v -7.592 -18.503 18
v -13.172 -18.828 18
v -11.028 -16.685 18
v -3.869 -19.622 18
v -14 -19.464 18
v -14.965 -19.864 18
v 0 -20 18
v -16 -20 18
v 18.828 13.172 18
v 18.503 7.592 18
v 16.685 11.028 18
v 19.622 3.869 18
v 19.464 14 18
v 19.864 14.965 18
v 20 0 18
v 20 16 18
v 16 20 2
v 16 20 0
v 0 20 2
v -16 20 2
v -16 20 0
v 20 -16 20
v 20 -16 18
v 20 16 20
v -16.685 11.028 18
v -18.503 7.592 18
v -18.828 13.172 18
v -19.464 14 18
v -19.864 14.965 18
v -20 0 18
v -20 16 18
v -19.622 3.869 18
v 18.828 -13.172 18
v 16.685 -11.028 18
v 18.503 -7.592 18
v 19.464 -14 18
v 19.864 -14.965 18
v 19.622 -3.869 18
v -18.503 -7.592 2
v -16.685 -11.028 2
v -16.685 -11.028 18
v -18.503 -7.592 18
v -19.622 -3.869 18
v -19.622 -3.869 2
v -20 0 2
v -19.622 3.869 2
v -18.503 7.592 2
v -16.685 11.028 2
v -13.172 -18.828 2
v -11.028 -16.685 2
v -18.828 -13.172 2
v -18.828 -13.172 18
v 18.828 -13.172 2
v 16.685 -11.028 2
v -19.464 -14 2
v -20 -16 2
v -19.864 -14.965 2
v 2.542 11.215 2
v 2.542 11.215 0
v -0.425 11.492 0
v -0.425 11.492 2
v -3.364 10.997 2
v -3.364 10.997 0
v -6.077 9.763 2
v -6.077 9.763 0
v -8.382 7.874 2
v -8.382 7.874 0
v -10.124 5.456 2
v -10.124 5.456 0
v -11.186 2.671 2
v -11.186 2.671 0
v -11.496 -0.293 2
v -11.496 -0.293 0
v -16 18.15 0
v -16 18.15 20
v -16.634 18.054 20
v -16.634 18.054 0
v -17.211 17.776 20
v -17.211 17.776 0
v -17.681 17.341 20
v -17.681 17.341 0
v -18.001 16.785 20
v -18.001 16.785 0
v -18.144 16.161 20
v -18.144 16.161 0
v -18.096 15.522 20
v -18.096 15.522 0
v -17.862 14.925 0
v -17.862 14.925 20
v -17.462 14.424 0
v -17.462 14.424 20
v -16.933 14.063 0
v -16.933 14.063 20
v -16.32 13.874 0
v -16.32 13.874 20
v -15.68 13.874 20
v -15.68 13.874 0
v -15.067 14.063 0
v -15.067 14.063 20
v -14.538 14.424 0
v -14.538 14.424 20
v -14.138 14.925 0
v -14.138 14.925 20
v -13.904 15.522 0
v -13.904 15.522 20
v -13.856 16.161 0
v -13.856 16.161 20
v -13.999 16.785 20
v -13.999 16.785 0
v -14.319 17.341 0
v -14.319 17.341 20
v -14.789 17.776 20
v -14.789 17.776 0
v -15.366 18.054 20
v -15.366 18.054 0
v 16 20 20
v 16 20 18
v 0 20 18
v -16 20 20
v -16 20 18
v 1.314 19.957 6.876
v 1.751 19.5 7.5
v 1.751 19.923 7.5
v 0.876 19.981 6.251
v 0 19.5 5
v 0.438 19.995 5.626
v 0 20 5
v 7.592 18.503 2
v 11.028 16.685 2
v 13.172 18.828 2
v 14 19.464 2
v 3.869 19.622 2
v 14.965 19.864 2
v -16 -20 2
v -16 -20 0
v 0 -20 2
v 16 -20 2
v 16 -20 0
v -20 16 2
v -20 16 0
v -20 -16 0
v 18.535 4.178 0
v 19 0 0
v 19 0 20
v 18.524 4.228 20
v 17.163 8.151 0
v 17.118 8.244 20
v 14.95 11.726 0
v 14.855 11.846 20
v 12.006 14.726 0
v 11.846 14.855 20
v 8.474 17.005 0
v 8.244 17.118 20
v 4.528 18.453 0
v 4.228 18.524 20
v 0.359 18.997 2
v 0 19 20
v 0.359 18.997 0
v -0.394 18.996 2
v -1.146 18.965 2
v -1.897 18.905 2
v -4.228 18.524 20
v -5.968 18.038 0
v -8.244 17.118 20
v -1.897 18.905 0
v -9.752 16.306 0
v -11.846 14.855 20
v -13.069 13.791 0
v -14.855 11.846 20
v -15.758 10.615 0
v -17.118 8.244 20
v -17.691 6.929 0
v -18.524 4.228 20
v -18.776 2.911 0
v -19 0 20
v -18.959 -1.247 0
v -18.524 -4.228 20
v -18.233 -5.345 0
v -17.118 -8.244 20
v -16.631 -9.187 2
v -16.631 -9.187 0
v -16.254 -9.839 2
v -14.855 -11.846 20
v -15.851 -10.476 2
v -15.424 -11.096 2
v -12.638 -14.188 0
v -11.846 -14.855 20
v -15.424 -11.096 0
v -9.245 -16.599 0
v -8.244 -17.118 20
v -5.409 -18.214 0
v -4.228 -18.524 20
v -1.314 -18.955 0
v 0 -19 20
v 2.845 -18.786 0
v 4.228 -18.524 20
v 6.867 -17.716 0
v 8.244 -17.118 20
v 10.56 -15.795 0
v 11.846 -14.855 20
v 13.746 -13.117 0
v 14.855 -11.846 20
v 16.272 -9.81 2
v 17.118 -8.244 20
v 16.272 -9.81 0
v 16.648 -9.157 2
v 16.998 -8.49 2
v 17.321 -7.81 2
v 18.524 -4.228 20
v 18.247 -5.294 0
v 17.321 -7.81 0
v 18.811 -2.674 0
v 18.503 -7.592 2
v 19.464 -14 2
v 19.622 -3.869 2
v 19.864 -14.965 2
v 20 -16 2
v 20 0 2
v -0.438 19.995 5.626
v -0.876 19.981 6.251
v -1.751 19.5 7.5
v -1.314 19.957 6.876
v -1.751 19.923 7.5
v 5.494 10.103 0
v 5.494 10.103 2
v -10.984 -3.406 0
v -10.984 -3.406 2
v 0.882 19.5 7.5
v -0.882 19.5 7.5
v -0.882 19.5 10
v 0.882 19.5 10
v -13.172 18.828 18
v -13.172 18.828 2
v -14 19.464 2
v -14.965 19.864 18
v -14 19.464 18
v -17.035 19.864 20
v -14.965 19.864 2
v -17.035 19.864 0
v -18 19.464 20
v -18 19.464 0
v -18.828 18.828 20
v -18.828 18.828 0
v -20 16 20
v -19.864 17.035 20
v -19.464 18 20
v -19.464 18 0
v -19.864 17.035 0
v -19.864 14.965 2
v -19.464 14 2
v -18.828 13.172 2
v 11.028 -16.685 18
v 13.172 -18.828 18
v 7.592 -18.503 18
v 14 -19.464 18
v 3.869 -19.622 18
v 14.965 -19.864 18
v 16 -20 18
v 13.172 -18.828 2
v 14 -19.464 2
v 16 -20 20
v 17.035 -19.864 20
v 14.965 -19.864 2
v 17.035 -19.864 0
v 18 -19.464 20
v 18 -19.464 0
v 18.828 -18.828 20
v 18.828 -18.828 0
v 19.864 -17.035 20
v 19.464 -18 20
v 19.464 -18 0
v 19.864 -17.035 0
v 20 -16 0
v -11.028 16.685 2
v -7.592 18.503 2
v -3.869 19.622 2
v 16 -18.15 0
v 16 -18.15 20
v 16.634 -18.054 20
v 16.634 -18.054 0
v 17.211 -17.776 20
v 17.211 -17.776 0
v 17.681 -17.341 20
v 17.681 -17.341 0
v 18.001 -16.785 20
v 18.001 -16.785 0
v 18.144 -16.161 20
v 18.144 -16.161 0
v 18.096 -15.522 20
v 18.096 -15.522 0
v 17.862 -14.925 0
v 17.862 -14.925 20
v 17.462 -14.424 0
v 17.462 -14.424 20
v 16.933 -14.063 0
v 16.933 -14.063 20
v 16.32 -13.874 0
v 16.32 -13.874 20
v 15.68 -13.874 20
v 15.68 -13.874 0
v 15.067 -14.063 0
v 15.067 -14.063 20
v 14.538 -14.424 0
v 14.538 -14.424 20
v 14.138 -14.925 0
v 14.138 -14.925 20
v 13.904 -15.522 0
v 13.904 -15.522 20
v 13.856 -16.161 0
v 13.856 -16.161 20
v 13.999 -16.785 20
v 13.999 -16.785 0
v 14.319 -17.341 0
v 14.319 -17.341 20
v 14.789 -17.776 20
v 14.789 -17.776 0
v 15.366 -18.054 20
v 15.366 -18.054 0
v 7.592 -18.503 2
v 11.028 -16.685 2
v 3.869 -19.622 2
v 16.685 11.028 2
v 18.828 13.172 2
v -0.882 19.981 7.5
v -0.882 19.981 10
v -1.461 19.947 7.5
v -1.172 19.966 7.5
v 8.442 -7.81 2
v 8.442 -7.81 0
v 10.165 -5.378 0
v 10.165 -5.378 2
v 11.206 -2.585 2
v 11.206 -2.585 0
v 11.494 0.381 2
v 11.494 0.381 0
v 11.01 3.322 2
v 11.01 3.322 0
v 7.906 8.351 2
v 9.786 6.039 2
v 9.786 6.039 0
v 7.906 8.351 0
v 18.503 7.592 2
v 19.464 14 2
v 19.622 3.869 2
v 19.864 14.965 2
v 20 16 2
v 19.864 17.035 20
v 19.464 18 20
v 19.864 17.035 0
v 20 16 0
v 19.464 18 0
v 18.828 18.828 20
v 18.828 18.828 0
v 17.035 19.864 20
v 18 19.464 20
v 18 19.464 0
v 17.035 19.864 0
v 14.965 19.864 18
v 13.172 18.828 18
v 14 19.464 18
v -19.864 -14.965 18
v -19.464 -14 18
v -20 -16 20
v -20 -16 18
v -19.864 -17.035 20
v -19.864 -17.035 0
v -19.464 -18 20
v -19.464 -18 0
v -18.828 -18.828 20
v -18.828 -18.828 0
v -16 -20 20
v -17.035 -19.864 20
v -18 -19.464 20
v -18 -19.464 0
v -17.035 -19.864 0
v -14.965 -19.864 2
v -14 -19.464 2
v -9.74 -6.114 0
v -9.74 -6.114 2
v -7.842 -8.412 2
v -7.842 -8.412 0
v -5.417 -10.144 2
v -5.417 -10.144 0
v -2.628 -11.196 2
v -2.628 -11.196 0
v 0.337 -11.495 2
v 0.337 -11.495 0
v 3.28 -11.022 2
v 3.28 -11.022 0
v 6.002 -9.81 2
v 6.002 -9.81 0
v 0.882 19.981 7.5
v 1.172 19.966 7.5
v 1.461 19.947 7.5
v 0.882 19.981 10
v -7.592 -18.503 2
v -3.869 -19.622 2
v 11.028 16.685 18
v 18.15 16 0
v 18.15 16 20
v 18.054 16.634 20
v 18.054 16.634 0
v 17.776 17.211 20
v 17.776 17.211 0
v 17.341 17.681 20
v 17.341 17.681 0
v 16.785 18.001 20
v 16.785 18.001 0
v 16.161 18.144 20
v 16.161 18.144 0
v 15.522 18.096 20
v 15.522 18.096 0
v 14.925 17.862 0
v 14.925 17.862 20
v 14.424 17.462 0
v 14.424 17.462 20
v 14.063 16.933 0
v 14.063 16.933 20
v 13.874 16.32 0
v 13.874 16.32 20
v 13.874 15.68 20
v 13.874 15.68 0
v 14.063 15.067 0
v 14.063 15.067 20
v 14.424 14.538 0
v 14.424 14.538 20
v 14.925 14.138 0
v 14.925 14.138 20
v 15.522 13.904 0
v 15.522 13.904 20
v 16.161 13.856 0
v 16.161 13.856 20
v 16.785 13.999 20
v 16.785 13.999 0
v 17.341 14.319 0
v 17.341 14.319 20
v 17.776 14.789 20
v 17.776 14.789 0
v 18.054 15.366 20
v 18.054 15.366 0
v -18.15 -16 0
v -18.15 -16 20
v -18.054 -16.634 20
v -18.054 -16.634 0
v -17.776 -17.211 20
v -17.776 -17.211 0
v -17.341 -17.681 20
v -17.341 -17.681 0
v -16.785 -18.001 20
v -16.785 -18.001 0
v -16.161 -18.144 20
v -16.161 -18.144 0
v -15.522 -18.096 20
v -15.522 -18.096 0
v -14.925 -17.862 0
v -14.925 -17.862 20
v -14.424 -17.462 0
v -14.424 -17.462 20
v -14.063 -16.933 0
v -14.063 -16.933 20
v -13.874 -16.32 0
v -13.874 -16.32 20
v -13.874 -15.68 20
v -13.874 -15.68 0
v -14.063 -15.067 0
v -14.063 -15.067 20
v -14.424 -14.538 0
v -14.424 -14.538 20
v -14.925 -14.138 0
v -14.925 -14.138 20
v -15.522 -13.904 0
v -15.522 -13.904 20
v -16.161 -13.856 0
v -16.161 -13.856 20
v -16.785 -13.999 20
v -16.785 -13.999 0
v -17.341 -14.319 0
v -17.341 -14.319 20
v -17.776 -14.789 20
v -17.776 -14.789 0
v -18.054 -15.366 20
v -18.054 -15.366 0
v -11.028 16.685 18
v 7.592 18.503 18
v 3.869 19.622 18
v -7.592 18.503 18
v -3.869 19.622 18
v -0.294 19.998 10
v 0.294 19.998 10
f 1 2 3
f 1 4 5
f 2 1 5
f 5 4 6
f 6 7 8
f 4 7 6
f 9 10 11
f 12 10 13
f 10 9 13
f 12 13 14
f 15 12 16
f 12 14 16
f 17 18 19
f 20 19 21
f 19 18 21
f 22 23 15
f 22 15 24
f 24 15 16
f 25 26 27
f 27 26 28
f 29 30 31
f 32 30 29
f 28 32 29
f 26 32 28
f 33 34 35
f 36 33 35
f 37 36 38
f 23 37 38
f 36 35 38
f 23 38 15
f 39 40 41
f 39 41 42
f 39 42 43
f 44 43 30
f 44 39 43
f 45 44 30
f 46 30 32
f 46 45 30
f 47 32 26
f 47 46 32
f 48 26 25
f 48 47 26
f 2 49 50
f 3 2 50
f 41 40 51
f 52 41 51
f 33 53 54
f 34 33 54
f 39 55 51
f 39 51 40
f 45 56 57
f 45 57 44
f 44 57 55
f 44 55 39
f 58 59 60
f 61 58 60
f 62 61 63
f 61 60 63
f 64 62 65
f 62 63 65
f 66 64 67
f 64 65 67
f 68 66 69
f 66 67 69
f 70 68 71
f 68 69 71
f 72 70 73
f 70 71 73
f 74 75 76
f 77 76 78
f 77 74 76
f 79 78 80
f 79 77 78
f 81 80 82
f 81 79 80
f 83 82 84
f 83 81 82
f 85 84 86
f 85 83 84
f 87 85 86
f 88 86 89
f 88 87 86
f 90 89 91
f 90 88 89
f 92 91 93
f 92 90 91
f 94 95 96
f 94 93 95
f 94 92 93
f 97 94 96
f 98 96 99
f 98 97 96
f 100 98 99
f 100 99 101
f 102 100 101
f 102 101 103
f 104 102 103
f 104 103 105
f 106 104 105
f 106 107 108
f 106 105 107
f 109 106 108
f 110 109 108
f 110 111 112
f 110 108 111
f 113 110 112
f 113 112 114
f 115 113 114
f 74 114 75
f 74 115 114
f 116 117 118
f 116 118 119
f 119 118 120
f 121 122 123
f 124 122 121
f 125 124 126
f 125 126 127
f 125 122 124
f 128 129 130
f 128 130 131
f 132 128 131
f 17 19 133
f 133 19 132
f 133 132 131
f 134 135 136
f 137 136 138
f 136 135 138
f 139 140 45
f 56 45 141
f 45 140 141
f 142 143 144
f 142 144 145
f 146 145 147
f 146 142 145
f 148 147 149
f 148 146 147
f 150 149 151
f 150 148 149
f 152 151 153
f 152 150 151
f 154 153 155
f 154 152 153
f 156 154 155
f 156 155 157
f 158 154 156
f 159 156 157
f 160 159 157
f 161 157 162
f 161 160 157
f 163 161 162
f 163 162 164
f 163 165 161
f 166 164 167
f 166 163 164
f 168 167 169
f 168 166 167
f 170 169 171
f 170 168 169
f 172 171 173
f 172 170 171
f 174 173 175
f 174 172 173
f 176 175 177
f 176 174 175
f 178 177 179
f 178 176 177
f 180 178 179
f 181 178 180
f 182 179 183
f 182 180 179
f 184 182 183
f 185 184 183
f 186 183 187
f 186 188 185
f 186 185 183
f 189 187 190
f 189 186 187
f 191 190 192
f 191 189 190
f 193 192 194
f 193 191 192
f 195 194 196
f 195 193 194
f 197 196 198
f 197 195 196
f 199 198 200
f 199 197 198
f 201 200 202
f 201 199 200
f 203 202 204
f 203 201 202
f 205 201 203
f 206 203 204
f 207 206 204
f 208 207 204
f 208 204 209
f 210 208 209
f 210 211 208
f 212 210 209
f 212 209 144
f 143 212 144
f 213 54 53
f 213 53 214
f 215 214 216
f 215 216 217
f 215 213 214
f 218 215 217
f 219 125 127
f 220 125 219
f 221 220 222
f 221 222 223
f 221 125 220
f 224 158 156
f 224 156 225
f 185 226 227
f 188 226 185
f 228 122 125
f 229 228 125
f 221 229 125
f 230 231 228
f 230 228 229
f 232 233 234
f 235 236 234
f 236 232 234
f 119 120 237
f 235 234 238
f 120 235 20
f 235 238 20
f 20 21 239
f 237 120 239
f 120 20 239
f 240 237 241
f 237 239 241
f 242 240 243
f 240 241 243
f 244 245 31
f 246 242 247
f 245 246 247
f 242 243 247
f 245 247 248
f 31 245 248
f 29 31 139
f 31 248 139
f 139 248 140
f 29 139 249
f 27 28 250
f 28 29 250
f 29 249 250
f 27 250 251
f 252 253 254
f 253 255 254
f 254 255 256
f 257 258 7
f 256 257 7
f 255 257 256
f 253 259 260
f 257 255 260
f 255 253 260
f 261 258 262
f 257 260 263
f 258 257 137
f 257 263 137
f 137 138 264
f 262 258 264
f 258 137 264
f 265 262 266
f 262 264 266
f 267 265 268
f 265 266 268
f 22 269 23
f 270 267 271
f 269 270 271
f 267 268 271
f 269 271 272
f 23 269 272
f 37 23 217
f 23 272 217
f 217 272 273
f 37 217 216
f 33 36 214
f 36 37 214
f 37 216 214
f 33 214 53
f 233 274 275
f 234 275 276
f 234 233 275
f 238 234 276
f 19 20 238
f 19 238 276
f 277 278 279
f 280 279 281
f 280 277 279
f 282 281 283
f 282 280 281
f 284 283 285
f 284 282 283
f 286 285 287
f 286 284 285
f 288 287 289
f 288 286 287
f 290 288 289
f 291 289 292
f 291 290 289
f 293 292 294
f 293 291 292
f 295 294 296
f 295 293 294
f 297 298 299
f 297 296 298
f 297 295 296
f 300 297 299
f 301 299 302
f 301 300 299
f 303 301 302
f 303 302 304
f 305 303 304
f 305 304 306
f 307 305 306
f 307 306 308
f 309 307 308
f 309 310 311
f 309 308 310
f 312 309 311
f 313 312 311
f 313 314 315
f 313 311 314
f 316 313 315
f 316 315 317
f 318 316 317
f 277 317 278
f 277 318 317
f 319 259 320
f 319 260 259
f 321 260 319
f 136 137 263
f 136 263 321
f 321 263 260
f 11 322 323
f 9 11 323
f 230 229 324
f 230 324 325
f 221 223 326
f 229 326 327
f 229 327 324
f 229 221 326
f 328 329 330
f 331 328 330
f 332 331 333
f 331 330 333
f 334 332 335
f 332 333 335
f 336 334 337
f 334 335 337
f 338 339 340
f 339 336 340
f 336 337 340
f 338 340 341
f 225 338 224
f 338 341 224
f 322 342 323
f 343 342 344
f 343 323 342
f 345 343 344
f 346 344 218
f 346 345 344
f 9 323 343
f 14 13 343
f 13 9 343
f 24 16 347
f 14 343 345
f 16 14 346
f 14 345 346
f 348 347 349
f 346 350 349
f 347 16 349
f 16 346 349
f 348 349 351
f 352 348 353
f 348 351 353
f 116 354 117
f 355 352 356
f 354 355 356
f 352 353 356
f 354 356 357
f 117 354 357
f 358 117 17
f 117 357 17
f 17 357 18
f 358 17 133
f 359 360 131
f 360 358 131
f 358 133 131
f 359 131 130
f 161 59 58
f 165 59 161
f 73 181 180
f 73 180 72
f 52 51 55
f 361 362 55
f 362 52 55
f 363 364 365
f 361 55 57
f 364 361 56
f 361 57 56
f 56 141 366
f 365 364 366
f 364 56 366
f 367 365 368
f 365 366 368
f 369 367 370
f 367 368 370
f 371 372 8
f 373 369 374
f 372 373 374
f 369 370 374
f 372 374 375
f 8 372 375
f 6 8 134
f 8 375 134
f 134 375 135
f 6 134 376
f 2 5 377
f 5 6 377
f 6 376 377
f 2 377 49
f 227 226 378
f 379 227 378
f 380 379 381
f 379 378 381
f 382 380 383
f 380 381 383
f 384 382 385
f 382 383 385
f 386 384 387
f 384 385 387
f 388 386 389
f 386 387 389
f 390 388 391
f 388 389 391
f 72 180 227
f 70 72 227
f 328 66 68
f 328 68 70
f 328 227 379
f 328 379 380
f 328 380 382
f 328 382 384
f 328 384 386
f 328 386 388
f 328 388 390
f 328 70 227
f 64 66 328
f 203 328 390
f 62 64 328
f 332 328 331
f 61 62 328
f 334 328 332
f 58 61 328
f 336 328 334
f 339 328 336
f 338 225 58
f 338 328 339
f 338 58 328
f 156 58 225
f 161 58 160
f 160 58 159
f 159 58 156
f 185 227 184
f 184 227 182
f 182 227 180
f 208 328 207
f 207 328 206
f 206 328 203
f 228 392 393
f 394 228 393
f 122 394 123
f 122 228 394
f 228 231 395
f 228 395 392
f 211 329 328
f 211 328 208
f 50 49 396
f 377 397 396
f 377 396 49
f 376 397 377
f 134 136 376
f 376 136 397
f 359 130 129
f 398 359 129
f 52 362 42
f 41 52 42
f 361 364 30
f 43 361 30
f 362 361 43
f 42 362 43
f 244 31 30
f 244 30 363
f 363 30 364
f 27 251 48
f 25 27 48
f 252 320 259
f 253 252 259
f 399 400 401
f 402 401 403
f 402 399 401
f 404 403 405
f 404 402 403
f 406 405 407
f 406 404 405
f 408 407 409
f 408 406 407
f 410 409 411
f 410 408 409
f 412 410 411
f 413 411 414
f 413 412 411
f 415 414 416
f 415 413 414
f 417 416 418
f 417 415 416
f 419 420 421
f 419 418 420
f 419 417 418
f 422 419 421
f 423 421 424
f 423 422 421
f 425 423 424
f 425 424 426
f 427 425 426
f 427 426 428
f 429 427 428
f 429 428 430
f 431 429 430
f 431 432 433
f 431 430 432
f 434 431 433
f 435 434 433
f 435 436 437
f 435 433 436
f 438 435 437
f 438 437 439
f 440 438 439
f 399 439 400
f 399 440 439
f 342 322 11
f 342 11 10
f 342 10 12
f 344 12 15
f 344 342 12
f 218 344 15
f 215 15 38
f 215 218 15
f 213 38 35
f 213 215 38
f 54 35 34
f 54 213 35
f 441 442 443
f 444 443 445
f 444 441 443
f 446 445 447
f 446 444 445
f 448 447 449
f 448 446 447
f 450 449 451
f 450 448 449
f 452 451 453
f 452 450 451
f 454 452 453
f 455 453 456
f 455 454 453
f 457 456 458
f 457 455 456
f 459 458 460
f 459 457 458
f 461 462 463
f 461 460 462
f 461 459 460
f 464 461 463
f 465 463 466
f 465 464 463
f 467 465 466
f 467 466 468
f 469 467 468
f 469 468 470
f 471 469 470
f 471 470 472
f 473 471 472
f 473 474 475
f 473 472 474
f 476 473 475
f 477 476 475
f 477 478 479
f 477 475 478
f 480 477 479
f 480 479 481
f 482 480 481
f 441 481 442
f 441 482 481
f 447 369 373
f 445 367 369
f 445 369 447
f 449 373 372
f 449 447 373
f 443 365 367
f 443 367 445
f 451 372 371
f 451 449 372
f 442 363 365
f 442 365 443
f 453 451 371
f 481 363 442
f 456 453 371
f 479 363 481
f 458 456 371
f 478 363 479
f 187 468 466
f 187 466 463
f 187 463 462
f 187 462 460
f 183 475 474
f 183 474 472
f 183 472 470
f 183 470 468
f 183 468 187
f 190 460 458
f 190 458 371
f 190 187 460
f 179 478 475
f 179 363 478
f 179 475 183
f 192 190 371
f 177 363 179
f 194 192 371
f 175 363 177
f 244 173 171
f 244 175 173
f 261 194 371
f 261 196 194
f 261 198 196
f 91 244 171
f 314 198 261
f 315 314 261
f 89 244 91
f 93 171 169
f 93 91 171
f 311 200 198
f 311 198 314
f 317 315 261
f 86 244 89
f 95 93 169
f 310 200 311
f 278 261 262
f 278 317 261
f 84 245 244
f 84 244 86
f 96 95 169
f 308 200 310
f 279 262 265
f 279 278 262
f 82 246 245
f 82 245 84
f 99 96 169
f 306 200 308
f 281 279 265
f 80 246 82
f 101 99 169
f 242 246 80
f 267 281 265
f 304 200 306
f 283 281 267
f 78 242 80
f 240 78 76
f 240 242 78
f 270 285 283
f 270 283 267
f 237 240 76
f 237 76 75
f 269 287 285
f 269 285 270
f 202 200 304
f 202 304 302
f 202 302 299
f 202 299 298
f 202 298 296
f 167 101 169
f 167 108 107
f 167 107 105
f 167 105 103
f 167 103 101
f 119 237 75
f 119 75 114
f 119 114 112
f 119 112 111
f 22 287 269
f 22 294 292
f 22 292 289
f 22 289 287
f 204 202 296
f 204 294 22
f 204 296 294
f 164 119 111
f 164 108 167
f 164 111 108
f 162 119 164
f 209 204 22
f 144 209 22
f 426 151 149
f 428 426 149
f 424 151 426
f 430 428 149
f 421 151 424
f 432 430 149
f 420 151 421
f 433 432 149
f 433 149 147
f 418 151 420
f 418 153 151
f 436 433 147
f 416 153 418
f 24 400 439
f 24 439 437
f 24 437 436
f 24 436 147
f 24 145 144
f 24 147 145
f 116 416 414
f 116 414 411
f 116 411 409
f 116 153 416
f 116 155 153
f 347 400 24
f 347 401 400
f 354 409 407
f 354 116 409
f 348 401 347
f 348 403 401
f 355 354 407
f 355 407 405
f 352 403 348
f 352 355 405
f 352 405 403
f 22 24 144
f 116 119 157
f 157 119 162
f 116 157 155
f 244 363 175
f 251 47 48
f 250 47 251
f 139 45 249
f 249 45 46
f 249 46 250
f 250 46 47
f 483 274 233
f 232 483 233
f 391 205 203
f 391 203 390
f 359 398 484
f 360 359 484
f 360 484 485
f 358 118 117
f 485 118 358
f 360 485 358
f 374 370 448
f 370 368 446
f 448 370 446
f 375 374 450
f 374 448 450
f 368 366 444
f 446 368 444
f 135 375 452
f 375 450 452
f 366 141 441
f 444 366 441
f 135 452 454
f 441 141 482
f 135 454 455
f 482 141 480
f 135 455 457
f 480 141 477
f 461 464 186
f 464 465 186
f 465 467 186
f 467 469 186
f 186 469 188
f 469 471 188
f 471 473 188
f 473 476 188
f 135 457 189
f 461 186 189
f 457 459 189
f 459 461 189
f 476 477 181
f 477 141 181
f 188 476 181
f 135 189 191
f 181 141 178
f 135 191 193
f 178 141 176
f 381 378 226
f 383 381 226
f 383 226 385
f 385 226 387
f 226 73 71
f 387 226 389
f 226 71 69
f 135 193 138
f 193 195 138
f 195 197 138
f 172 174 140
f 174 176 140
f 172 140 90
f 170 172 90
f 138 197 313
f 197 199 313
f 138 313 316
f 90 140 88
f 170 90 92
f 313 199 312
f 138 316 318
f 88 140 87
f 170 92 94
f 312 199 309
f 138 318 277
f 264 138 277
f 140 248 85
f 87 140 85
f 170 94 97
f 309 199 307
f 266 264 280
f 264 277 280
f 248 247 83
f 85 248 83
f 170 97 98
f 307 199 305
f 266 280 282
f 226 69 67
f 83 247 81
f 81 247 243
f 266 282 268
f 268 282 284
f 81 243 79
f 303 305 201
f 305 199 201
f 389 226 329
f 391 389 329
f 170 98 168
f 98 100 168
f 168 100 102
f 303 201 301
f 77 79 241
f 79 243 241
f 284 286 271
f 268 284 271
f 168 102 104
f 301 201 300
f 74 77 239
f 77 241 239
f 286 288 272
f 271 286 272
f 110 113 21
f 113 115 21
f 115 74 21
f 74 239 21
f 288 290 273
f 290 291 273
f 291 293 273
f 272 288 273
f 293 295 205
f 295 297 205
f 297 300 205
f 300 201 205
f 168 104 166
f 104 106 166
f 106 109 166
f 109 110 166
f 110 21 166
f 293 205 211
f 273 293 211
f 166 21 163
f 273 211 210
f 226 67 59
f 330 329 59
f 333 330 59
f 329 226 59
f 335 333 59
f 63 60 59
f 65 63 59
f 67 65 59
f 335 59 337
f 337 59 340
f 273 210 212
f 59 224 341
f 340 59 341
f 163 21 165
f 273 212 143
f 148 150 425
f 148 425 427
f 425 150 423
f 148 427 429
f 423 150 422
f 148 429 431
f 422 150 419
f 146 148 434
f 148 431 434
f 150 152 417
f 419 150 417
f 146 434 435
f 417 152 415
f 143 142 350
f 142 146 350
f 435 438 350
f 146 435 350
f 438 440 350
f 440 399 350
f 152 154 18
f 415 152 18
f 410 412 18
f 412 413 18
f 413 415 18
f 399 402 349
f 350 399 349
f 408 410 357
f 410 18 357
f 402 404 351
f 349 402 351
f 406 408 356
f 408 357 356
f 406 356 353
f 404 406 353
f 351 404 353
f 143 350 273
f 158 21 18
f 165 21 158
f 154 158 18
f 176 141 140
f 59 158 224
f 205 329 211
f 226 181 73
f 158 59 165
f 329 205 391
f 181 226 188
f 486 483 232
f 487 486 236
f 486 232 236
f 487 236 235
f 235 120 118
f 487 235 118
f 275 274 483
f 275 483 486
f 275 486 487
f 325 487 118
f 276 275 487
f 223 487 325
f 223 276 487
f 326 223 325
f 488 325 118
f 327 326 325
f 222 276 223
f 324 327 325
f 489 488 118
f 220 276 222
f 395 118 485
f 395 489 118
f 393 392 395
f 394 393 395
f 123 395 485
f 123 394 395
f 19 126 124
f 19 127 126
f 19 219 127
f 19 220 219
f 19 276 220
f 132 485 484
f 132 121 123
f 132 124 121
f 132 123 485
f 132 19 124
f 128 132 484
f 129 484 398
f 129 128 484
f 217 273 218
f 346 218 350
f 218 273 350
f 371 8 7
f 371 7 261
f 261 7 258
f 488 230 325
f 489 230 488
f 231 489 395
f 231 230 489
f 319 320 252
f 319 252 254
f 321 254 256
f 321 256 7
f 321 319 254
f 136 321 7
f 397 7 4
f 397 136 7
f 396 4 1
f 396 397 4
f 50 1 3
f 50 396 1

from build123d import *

# Parameters (mm, degrees)
SKETCH_BODY_R                       = 19
BODY_DEPTH                          = 20
SKETCH_CUT_BODY_W                   = 16
SKETCH_CUT_BODY_H                   = 6.627416998
REINFORCMENT_STRIP_REACH            = 36.641
CIRPATTERN_REINFORCMENT_STRIP_COUNT = 4
SKETCH_FIXING_HOLE_R                = 2.15
FIXING_HOLE_DEPTH                   = 35.641016151
CIRPATTERN_FIXING_HOLE_COUNT        = 4
BONE_DEPTH                          = 2
CIRPATTERN_BONE_COUNT               = 3
SKETCH_FIXING_PLATE_FAN_R           = 11.5
FIXING_PLATE_FAN_DEPTH              = 2
AIR_EXHAUST_DEPTH                   = 49.582404222


with BuildPart() as part:
    # Sketch-Body → Body (new body)
    with BuildSketch(Plane.XY):
        with BuildLine():
            Line((-16, -20), (16, -20))
            ThreePointArc((16, -20), (18.828427125, -18.828427125), (20, -16))
            Line((20, -16), (20, 16))
            ThreePointArc((20, 16), (18.828427125, 18.828427125), (16, 20))
            Line((16, 20), (-16, 20))
            ThreePointArc((-16, 20), (-18.828427125, 18.828427125), (-20, 16))
            Line((-20, 16), (-20, -16))
            ThreePointArc((-20, -16), (-18.828427125, -18.828427125), (-16, -20))
        make_face()
        Circle(SKETCH_BODY_R, mode=Mode.SUBTRACT)
    extrude(amount=BODY_DEPTH)

    # Sketch-Cut-Body → Cut-Body (revolve, cut)
    with BuildSketch(Plane(origin=(0, 0, 0), x_dir=(0, 0, -1), z_dir=(1, 0, 0)), mode=Mode.PRIVATE) as cut_body_sk:
        with Locations((-10, 23.313708499)):
            Rectangle(SKETCH_CUT_BODY_W, SKETCH_CUT_BODY_H)
    revolve(cut_body_sk.sketch.rotate(Axis((0, 0, 20), (0, 0, -1)), 180), axis=Axis((0, 0, 20), (0, 0, -1)), mode=Mode.SUBTRACT)

    # Sketch-Reinforcment-Strip → Reinforcment-Strip (add, up to next)
    with BuildSketch(Plane.XY, mode=Mode.PRIVATE) as reinforcment_strip_sk1:
        with BuildLine():
            Line((16.684833585, 11.027979336), (18.828427125, 13.171572875))
            ThreePointArc((18.828427125, 13.171572875), (18.828427125, 18.828427125), (13.171572875, 18.828427125))
            Line((13.171572875, 18.828427125), (11.027979336, 16.684833585))
            ThreePointArc((11.027979336, 16.684833585), (14.142135624, 14.142135624), (16.684833585, 11.027979336))
        make_face()
    reinforcment_strip_tool1 = extrude(reinforcment_strip_sk1.sketch, amount=REINFORCMENT_STRIP_REACH, mode=Mode.PRIVATE) - part.part
    reinforcment_strip = reinforcment_strip_tool1.solids().sort_by_distance((16.181232, 16.181232, 0))[0]
    add(reinforcment_strip)

    # CirPattern-Reinforcment-Strip: Reinforcment-Strip ×4 about axis
    cirpattern_reinforcment_strip_axis = Axis((0, 0, 0), (0, 0, 1))
    for i in range(1, CIRPATTERN_REINFORCMENT_STRIP_COUNT):
        add(reinforcment_strip.rotate(cirpattern_reinforcment_strip_axis, i * 360 / CIRPATTERN_REINFORCMENT_STRIP_COUNT))

    # Sketch-Fixing-Hole → Fixing-Hole (cut, through all)
    with BuildSketch(Plane.XY):
        with Locations((16, 16)):
            Circle(SKETCH_FIXING_HOLE_R)
    fixing_hole = extrude(amount=FIXING_HOLE_DEPTH, mode=Mode.SUBTRACT)

    # CirPattern-Fixing-Hole: Fixing-Hole ×4 about axis
    cirpattern_fixing_hole_axis = Axis((0, 0, 0), (0, 0, 1))
    for i in range(1, CIRPATTERN_FIXING_HOLE_COUNT):
        add(fixing_hole.rotate(cirpattern_fixing_hole_axis, i * 360 / CIRPATTERN_FIXING_HOLE_COUNT), mode=Mode.SUBTRACT)

    # Sketch-Bone → Bone (add)
    with BuildSketch(Plane.XY):
        with BuildLine():
            Line((-10.98406242, -3.405931994), (-15.423655551, -11.09553286))
            ThreePointArc((-15.423655551, -11.09553286), (-16.055816657, -10.159269239), (-16.631216794, -9.187090287))
            Line((-16.631216794, -9.187090287), (-11.496264484, -0.293091992))
            ThreePointArc((-11.496264484, -0.293091992), (-11.347410174, -1.867158898), (-10.98406242, -3.405931994))
        make_face()
    bone = extrude(amount=BONE_DEPTH)

    # CirPattern-Bone: Bone ×3 about axis
    cirpattern_bone_axis = Axis((0, 0, 0), (0, 0, 1))
    for i in range(1, CIRPATTERN_BONE_COUNT):
        add(bone.rotate(cirpattern_bone_axis, i * 360 / CIRPATTERN_BONE_COUNT))

    # Sketch-Fixing-Plate-Fan → Fixing-Plate-Fan (add)
    with BuildSketch(Plane.XY):
        Circle(SKETCH_FIXING_PLATE_FAN_R)
    extrude(amount=FIXING_PLATE_FAN_DEPTH)

    # Sketch2 → Air-Exhaust (cut, through all)
    with BuildSketch(Plane(origin=(0, 19.5, 0), x_dir=(-1, 0, 0), z_dir=(0, 1, 0))):
        Polygon((-1.750518846, 7.5), (0, 5), (1.750518846, 7.5), (0.881634904, 7.5), (0.881634904, 10), (-0.881634904, 10), (-0.881634904, 7.5), align=None)
    extrude(amount=AIR_EXHAUST_DEPTH, mode=Mode.SUBTRACT)


solid = part.part
